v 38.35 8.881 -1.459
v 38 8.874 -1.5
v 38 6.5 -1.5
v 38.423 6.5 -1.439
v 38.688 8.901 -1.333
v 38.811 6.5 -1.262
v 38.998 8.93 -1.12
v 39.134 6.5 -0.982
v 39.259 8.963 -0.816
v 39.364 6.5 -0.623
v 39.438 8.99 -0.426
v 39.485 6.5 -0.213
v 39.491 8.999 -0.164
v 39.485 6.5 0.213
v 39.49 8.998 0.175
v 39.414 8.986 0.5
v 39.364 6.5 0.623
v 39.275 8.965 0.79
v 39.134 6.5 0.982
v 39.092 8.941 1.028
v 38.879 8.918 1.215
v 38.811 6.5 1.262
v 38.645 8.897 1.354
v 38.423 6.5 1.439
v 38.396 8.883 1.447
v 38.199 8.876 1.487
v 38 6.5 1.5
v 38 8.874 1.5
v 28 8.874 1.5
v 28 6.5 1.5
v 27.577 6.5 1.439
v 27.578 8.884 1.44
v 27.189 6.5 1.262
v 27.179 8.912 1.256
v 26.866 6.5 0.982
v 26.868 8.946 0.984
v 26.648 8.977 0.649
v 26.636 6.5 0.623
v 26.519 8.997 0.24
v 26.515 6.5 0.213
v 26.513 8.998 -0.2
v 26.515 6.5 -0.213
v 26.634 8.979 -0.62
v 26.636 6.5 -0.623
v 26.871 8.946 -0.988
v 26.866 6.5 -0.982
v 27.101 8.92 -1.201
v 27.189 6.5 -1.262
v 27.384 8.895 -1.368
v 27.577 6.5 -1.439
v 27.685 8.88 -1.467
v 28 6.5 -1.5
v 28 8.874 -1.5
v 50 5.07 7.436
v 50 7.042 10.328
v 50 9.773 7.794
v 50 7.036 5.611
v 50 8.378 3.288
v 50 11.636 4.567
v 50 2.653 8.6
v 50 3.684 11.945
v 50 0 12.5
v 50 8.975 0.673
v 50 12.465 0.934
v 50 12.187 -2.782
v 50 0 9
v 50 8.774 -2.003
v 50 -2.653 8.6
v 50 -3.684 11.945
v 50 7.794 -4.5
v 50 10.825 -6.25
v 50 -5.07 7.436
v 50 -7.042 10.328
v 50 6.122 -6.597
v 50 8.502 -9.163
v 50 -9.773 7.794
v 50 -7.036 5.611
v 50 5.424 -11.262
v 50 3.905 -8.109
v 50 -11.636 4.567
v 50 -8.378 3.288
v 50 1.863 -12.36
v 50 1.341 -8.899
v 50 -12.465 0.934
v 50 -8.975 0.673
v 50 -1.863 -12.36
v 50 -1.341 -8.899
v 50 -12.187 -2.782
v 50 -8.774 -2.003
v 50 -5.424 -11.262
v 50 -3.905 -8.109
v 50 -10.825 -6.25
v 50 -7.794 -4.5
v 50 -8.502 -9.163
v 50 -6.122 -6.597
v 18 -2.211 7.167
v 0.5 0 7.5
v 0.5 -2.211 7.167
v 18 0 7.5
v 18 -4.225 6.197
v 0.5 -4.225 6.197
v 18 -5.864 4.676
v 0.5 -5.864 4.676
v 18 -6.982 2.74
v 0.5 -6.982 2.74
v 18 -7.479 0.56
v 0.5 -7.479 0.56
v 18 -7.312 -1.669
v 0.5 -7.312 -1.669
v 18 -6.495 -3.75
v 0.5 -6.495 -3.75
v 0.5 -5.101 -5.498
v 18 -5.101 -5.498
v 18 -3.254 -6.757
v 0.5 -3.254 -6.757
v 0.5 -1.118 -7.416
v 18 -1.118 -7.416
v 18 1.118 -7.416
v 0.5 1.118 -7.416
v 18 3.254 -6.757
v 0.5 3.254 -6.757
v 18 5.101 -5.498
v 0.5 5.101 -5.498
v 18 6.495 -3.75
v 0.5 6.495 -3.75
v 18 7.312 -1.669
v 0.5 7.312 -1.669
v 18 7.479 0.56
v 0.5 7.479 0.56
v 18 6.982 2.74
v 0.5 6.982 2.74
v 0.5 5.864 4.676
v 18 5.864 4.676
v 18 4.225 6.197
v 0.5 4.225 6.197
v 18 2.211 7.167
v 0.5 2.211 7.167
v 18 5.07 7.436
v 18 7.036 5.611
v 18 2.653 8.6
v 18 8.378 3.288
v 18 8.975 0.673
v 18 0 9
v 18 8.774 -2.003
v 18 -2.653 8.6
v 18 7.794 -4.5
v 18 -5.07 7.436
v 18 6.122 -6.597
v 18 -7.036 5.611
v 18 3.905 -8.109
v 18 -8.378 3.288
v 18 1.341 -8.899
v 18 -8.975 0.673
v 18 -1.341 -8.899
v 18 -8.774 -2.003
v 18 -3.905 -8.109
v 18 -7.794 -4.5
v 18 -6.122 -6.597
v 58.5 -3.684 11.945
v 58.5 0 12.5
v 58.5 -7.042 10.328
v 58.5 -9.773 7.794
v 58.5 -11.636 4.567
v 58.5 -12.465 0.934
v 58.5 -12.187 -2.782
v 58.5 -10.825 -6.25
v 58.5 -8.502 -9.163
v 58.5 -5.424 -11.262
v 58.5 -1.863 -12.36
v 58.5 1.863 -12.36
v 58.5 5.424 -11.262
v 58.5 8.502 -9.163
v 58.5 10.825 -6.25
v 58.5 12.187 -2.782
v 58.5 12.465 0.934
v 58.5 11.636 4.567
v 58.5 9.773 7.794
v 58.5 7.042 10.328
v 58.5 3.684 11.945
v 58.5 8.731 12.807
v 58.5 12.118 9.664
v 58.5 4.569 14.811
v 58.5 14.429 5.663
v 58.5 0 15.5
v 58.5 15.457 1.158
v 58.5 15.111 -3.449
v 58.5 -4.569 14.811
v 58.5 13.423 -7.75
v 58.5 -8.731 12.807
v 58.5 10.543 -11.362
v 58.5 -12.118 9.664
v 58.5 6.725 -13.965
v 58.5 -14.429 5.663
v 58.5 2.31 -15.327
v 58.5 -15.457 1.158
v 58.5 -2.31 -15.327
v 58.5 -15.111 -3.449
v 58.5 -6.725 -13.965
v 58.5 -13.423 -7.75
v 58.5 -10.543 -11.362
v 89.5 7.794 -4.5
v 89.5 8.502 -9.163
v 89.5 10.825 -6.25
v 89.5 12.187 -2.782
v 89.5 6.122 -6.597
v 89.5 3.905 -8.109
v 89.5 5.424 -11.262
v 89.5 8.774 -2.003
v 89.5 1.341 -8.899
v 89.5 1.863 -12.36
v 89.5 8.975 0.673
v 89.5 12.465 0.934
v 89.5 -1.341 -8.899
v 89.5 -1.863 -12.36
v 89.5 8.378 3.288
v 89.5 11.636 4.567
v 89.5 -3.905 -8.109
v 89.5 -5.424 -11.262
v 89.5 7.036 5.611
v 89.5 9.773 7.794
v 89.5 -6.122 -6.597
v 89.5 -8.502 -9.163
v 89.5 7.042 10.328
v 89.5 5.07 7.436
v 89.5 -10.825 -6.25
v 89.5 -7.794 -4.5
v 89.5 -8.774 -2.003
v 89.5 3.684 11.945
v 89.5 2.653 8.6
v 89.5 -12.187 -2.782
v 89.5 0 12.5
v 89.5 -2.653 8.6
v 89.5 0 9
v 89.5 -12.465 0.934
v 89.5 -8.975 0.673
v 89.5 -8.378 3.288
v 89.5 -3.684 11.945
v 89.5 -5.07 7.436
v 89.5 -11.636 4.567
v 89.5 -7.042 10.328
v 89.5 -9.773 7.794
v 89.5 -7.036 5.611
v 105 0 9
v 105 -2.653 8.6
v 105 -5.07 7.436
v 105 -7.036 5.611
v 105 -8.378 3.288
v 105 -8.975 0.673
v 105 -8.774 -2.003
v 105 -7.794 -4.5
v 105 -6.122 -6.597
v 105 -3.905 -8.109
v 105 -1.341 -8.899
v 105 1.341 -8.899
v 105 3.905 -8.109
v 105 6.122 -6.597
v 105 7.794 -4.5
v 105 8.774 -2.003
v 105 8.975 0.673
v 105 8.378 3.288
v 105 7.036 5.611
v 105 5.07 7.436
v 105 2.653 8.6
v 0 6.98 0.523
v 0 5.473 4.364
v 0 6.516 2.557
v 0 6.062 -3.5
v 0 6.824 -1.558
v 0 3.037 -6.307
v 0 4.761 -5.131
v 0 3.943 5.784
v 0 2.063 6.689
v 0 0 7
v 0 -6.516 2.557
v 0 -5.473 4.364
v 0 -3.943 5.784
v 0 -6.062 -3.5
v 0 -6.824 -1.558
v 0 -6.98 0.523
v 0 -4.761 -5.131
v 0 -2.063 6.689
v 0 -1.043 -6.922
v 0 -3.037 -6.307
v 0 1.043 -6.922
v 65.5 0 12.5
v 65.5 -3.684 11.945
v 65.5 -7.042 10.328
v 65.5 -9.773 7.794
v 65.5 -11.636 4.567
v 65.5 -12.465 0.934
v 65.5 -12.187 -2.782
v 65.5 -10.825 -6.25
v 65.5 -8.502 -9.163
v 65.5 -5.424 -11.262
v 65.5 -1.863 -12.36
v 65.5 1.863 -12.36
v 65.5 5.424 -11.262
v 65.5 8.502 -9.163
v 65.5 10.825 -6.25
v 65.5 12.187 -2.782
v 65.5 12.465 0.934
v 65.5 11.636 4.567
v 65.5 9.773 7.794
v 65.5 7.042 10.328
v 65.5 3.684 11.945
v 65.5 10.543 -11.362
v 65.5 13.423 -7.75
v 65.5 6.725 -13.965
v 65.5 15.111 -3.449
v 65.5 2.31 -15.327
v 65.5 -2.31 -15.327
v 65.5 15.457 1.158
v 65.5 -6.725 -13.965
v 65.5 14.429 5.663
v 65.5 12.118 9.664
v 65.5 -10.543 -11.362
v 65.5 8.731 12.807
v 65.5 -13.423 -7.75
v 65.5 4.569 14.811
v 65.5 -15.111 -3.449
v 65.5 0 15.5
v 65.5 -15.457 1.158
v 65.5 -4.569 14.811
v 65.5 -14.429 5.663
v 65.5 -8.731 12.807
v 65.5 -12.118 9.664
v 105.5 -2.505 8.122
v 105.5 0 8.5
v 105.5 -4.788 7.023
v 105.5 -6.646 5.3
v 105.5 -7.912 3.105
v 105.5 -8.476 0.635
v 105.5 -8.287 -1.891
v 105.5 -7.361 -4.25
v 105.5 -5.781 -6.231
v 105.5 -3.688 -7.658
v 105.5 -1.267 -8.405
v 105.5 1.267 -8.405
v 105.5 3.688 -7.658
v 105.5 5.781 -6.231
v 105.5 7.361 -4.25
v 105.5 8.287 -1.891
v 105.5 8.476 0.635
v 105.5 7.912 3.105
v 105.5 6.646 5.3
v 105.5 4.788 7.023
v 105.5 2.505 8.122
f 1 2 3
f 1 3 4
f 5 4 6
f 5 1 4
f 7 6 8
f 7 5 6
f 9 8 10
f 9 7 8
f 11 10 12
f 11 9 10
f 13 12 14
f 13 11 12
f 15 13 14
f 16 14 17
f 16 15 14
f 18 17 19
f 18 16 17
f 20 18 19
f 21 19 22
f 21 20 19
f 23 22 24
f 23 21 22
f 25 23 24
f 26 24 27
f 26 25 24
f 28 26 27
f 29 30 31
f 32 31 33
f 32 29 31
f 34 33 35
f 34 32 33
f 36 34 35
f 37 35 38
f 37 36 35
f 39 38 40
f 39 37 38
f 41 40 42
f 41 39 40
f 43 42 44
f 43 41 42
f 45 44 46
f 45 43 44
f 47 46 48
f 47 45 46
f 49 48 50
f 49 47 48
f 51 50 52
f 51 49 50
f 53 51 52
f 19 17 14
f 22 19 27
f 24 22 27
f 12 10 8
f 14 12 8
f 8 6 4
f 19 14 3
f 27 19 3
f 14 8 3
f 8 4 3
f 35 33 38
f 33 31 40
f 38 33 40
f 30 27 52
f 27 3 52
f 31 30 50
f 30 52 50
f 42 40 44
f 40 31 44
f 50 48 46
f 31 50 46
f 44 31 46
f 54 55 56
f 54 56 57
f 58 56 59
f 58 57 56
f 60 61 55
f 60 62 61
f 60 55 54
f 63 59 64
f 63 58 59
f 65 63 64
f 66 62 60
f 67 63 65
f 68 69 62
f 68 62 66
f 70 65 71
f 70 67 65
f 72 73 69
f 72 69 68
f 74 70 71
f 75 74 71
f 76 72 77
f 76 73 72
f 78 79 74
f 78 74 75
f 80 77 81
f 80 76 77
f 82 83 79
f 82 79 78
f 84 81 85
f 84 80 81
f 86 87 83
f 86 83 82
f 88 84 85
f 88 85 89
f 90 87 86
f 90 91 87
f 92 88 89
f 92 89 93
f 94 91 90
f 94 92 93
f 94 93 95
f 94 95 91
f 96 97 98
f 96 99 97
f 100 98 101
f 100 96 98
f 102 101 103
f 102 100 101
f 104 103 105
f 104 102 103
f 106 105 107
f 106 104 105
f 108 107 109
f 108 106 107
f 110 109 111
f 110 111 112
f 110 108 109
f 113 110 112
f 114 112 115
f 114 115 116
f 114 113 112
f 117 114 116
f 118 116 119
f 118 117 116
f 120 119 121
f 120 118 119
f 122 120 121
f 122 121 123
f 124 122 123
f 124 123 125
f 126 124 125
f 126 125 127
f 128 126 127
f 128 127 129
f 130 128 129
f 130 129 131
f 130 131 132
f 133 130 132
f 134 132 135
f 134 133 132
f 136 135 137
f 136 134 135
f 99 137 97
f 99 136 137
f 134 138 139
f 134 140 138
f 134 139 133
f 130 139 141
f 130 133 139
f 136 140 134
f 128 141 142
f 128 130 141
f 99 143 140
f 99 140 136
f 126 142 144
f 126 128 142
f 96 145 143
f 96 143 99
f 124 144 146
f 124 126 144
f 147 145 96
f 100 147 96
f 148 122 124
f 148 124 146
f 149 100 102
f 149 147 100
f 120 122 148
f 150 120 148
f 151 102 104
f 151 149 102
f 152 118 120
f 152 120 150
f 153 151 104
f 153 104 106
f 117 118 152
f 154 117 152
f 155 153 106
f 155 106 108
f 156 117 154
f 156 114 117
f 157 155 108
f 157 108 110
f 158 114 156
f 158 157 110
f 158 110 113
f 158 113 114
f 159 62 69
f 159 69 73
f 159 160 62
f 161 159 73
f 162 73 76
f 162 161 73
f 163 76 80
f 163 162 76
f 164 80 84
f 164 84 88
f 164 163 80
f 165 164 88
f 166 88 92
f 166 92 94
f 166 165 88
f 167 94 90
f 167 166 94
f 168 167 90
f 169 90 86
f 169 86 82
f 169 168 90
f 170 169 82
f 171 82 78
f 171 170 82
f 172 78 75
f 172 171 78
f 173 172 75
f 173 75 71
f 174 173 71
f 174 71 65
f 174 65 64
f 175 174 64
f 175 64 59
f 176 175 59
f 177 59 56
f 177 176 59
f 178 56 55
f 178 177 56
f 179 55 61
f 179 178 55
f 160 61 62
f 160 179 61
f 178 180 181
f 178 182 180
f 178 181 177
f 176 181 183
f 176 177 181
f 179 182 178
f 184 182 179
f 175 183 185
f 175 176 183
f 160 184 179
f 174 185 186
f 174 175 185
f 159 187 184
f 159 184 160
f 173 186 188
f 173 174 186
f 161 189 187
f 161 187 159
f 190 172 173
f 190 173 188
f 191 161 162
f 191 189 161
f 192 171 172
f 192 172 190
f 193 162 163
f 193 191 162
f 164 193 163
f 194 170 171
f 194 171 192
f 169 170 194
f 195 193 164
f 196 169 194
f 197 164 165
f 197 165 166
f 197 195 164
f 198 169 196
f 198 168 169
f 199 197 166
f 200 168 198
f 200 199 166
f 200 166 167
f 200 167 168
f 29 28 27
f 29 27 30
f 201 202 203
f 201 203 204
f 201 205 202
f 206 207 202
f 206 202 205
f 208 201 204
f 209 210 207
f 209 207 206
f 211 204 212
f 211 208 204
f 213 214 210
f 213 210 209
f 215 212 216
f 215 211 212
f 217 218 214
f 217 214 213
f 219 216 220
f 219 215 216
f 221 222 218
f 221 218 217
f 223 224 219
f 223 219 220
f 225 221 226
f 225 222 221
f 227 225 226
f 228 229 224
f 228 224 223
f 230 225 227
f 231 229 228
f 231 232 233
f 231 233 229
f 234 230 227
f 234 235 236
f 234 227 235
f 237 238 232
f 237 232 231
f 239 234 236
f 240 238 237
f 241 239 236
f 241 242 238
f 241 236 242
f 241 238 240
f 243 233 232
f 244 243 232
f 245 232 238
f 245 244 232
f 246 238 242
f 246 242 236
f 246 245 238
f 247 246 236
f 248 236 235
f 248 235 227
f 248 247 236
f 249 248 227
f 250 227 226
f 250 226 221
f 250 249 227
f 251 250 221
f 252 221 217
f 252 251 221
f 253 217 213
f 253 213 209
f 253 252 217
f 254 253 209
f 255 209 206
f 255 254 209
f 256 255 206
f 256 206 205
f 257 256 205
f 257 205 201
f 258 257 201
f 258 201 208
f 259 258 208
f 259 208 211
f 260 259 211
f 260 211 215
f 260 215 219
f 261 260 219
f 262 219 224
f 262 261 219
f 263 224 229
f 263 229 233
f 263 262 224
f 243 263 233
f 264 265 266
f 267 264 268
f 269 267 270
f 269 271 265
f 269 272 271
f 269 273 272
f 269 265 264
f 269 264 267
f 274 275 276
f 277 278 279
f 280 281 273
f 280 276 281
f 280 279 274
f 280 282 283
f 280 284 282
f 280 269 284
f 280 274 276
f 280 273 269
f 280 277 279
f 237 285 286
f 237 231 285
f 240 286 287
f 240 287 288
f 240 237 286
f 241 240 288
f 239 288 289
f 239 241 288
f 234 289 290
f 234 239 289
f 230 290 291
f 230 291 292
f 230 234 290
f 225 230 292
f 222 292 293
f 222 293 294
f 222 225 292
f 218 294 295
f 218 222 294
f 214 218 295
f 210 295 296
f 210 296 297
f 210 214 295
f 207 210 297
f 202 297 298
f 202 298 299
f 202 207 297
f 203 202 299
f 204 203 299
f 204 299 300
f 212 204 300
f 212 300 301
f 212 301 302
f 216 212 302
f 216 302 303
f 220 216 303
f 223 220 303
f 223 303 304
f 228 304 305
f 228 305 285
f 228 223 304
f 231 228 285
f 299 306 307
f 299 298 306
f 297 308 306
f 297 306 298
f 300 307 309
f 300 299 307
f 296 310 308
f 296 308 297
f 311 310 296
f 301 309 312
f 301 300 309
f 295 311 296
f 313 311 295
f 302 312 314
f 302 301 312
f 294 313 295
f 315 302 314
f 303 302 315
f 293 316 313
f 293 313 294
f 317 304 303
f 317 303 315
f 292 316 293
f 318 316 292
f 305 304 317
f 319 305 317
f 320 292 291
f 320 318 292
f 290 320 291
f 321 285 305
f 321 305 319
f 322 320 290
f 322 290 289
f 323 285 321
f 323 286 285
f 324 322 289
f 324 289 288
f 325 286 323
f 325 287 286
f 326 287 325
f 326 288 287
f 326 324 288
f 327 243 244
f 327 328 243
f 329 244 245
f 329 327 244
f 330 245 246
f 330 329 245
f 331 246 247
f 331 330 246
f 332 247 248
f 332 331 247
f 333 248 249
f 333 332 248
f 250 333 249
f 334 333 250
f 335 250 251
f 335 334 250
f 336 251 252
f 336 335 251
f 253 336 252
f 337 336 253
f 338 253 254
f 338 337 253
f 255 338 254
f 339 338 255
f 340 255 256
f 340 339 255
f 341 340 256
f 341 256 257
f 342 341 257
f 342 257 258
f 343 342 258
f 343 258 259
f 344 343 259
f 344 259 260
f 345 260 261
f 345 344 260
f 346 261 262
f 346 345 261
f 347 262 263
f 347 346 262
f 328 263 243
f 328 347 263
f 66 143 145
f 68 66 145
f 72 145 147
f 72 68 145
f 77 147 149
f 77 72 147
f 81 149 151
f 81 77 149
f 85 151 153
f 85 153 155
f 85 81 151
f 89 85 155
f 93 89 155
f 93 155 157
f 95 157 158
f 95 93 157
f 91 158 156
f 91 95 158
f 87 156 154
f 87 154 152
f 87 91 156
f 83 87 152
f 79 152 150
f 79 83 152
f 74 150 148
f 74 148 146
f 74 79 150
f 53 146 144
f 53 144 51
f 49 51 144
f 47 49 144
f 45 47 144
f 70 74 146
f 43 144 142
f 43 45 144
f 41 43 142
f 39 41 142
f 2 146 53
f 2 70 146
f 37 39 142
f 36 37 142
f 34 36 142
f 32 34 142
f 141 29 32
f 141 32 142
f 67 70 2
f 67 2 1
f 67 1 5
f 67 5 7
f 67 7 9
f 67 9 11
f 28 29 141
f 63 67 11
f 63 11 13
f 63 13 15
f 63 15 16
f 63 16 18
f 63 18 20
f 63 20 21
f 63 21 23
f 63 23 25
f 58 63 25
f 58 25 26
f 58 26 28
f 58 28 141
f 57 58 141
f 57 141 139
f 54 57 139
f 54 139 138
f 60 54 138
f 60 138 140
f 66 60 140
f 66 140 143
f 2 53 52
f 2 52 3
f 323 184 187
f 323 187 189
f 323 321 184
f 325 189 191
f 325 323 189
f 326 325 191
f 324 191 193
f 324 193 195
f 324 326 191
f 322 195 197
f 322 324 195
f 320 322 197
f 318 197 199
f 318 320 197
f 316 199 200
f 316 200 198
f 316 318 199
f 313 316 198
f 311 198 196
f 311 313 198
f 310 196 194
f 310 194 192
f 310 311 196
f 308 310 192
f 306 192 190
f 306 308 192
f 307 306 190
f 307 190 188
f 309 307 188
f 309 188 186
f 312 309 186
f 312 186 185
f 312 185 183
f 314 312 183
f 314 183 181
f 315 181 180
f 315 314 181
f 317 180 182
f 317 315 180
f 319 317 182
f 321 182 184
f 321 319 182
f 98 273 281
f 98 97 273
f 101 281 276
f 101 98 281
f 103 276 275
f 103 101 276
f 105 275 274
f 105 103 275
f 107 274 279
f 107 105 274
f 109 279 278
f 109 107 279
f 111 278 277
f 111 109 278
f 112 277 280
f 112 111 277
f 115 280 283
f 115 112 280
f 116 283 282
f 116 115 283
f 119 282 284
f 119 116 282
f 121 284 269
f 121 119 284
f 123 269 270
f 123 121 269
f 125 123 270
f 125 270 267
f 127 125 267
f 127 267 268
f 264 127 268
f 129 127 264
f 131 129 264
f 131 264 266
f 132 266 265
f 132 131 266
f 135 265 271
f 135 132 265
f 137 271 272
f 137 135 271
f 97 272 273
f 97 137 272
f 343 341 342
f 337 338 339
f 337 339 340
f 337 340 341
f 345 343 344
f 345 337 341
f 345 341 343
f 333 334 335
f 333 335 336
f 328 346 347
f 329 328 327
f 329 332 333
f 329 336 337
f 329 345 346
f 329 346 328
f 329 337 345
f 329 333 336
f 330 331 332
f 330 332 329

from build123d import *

# Parameters (mm, degrees)
F_02_KEYWAY_DEPTH = 2.5


with BuildPart() as part:
    # 草图1 → 旋转1 (revolve)
    with BuildSketch(Plane.XY, mode=Mode.PRIVATE) as revolve_1_sk:
        Polygon((0, 0), (0, 7), (0.5, 7.5), (18, 7.5), (18, 9), (50, 9), (50, 12.5), (58.5, 12.5), (58.5, 15.5), (65.5, 15.5), (65.5, 12.5), (89.5, 12.5), (89.5, 9), (105, 9), (105.5, 8.5), (105.5, 0), align=None)
    revolve(revolve_1_sk.sketch.rotate(Axis((-5, 0, 0), (1, 0, 0)), 90), axis=Axis((-5, 0, 0), (1, 0, 0)))

    # 草图2 → 02_KEYWAY (cut)
    with BuildSketch(Plane(origin=(0, 9, 0), x_dir=(1, 0, 0), z_dir=(0, 1, 0))):
        with BuildLine():
            Line((28, 1.5), (38, 1.5))
            ThreePointArc((38, 1.5), (39.5, 0), (38, -1.5))
            Line((38, -1.5), (28, -1.5))
            ThreePointArc((28, -1.5), (26.5, 0), (28, 1.5))
        make_face()
    extrude(amount=-F_02_KEYWAY_DEPTH, mode=Mode.SUBTRACT)


solid = part.part
